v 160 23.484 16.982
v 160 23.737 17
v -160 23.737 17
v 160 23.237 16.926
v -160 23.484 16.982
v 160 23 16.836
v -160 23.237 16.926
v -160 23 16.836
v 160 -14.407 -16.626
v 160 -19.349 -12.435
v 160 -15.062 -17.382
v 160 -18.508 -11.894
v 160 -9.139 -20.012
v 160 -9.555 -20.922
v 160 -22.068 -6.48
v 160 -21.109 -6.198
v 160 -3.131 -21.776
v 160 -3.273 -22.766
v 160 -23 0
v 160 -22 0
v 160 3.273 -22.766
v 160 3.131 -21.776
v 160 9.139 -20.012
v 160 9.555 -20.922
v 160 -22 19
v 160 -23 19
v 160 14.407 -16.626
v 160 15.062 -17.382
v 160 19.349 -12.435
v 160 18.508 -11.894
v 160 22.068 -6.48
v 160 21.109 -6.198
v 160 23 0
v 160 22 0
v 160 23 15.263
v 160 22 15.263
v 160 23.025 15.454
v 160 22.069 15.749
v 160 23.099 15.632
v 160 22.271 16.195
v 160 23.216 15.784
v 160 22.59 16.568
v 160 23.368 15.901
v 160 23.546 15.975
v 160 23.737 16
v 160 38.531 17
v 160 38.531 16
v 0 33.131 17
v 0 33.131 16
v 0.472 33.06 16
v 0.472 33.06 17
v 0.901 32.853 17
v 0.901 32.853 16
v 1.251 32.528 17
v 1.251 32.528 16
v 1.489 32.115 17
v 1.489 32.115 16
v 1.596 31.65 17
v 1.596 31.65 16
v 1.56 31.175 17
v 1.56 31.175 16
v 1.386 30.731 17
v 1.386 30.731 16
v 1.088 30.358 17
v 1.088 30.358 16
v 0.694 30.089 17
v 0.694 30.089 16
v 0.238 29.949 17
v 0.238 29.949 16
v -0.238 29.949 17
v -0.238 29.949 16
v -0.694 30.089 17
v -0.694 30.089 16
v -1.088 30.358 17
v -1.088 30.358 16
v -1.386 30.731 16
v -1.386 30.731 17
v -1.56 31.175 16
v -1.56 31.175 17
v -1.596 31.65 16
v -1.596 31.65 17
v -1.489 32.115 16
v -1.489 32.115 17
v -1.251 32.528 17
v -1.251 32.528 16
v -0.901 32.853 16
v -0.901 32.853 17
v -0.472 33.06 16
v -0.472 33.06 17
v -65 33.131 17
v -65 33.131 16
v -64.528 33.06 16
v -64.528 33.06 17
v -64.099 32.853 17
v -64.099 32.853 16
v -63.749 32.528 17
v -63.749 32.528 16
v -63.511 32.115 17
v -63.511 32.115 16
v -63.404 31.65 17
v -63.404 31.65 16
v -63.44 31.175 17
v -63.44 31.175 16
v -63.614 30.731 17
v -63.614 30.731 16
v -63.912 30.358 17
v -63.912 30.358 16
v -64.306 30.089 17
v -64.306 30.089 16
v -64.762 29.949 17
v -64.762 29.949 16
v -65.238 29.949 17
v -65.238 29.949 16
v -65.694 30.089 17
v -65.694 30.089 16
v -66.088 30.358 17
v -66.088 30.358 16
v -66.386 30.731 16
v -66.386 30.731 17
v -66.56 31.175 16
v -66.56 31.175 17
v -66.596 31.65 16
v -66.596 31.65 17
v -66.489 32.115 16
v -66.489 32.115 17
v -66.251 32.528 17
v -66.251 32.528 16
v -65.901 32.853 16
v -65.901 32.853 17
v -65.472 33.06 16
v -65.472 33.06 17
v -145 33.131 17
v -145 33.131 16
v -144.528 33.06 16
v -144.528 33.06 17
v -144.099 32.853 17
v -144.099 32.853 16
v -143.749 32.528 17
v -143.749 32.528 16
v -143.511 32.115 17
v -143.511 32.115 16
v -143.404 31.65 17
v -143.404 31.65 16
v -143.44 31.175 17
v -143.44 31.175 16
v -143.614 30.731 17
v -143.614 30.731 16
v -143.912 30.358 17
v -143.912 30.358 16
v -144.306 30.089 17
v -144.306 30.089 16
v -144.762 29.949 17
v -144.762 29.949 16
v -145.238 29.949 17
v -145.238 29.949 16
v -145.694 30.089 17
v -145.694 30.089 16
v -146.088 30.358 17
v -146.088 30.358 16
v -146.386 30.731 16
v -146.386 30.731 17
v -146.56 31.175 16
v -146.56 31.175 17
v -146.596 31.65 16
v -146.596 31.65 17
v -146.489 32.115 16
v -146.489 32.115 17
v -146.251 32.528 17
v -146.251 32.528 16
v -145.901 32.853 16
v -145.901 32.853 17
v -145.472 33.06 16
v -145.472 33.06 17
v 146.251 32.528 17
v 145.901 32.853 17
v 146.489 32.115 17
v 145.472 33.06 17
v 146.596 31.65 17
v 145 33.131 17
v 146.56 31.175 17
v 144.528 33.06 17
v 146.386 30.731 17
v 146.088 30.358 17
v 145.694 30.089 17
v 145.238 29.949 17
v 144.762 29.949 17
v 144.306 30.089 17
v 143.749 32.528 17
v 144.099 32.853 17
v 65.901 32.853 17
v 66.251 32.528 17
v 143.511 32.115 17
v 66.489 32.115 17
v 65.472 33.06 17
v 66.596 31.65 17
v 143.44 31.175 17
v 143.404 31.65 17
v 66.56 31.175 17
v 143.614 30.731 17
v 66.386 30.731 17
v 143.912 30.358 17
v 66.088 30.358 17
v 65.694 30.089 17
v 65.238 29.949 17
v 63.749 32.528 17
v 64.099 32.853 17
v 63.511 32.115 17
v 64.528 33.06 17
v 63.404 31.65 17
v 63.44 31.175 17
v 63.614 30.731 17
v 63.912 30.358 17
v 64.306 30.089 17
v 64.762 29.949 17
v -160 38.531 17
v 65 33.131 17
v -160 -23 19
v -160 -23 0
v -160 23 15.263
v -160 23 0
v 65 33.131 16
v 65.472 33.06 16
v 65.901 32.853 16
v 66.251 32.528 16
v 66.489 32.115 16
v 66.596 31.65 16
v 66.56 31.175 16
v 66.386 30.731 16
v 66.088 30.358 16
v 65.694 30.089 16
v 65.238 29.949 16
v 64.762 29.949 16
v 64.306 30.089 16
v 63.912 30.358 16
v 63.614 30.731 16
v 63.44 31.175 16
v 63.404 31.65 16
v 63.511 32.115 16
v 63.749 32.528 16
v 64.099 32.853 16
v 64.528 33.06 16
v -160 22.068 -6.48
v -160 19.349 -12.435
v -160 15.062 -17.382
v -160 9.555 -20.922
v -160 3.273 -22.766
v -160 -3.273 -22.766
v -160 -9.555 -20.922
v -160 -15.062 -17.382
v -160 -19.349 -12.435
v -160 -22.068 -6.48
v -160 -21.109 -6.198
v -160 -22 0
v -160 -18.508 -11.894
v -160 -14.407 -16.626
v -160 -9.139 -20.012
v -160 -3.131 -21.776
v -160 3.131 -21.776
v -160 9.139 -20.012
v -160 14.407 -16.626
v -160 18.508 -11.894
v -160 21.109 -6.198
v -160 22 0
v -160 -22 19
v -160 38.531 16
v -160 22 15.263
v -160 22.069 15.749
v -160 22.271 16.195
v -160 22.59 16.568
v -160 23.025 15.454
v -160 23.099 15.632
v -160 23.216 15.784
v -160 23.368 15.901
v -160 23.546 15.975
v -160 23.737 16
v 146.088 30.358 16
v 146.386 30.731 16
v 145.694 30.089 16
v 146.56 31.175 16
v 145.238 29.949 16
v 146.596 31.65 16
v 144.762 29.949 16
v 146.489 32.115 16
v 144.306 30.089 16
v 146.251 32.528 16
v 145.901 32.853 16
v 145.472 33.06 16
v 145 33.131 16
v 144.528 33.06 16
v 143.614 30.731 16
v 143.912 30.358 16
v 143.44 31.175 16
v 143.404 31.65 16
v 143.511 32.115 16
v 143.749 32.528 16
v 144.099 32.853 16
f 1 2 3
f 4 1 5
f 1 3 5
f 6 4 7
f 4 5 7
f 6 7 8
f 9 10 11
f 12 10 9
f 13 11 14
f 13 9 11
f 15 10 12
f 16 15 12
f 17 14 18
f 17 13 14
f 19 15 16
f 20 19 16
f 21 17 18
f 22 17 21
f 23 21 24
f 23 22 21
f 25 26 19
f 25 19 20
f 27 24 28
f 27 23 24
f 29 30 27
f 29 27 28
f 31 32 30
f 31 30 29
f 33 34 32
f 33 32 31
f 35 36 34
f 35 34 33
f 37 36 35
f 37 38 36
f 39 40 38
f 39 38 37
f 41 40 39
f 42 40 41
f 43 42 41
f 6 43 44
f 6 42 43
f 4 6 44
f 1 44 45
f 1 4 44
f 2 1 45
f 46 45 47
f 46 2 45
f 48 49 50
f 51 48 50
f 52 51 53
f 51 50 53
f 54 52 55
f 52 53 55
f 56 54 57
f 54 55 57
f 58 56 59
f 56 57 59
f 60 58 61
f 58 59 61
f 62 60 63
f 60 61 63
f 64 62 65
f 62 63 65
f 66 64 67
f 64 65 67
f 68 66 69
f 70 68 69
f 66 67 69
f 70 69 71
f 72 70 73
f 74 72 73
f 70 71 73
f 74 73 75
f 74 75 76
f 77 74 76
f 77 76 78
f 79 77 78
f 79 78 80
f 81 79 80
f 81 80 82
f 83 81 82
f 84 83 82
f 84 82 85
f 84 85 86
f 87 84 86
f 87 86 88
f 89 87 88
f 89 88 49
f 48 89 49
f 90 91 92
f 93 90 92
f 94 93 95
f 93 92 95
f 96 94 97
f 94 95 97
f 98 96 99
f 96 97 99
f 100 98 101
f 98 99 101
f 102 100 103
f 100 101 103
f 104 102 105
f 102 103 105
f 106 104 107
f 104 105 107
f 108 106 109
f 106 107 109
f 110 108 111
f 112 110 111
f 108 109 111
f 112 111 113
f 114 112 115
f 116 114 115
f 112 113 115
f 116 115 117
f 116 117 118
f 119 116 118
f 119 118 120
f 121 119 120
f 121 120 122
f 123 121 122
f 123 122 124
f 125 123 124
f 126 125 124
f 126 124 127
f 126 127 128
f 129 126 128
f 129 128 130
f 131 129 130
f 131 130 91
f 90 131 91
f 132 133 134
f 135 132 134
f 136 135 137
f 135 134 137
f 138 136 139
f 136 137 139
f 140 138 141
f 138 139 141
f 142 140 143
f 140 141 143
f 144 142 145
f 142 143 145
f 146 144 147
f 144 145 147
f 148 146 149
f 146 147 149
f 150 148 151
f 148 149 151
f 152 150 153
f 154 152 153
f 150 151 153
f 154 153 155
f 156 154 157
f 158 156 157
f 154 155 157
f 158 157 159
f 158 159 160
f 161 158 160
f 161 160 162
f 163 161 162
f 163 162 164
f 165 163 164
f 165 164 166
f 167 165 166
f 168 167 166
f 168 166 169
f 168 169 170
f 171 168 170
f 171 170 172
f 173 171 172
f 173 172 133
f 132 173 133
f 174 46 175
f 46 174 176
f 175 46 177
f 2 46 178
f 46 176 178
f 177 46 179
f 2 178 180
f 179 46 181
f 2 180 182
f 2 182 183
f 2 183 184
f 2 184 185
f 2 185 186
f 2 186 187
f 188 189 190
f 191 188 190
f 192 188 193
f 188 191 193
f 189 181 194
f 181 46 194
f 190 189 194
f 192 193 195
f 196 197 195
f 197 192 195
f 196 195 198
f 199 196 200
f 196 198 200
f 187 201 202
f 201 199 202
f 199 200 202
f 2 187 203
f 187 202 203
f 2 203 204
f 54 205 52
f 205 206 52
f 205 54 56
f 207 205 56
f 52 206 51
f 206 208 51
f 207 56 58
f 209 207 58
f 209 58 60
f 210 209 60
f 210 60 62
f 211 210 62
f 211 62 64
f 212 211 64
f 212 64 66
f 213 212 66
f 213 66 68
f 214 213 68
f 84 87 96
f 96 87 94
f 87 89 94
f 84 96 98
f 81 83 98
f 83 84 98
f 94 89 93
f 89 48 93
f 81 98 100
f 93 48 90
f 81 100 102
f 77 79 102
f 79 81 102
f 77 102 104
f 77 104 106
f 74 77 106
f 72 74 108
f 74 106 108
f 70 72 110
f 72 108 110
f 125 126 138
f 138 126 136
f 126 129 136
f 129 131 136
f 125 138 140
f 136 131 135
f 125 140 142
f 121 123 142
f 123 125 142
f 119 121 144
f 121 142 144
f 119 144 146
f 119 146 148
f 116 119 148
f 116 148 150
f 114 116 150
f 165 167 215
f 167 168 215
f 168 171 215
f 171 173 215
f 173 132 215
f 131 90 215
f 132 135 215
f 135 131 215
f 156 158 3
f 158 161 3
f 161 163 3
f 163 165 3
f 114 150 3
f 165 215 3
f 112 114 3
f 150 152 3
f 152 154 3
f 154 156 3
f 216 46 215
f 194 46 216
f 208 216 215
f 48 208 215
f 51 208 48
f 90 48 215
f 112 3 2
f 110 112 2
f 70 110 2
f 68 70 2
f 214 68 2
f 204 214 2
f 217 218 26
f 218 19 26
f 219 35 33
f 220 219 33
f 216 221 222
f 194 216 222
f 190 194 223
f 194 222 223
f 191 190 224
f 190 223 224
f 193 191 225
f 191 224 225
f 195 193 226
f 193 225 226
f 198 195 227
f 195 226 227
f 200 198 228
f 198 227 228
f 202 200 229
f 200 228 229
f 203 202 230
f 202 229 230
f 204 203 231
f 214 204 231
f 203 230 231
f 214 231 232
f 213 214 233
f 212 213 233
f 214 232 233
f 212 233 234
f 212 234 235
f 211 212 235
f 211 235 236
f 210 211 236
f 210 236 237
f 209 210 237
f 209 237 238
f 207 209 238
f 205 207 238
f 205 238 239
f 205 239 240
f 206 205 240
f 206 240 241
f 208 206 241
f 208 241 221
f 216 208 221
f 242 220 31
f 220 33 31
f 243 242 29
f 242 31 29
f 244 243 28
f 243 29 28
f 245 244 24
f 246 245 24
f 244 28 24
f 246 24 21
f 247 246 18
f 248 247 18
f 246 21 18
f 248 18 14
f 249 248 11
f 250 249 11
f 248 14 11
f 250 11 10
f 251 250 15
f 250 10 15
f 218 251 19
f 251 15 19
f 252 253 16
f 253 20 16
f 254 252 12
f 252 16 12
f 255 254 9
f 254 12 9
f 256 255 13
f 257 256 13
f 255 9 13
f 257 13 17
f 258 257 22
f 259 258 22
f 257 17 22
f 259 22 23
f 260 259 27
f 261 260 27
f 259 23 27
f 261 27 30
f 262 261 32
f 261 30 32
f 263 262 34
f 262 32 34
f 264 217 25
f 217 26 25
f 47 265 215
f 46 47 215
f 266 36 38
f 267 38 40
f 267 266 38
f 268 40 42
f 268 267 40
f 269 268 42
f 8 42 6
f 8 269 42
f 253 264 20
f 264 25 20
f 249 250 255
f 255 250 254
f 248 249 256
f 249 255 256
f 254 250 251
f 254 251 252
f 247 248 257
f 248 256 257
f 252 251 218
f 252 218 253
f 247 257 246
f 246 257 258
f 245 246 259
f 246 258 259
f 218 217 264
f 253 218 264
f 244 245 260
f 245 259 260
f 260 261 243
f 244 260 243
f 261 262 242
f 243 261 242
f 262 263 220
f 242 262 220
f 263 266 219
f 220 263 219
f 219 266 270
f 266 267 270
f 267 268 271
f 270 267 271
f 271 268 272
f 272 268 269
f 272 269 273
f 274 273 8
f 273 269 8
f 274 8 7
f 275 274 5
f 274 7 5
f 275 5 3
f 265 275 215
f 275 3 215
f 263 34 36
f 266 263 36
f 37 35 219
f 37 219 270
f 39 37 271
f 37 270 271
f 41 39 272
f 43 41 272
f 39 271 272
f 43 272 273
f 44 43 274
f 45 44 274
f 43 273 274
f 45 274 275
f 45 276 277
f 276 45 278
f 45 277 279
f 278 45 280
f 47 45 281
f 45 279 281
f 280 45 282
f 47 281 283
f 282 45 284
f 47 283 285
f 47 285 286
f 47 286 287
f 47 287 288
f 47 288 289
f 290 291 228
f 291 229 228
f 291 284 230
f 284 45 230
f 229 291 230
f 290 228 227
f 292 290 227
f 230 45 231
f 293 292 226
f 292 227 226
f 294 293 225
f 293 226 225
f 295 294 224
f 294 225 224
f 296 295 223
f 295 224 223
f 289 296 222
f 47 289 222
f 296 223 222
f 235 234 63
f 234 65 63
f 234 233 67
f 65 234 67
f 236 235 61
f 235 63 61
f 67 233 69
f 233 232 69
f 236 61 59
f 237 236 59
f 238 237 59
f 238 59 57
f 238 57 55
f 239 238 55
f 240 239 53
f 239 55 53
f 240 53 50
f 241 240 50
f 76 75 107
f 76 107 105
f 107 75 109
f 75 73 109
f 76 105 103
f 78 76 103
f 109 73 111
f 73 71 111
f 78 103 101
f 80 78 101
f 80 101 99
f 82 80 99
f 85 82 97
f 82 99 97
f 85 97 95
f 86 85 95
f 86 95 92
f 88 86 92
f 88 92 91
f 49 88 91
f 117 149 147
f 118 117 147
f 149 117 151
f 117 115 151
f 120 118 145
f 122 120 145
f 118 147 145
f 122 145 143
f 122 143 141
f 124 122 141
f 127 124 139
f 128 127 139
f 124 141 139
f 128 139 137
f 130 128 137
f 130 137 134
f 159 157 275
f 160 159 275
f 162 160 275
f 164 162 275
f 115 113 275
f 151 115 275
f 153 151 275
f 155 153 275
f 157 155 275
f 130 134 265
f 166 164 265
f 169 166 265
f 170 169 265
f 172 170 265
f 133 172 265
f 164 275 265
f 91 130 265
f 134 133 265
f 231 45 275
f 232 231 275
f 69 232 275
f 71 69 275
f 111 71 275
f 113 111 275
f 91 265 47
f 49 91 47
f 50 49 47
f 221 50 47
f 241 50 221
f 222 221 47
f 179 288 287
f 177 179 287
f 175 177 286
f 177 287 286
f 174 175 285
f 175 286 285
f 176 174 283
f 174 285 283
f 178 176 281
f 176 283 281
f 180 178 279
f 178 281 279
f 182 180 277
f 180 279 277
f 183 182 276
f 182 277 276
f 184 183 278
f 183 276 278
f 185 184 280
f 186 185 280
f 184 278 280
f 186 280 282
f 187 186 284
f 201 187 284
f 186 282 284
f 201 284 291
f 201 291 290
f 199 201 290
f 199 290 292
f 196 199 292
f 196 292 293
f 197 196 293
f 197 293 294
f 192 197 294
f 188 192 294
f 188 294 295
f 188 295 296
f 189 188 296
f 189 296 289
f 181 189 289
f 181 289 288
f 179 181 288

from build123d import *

# Parameters (mm, degrees)
SM_BASE_FLANGE_1_DEPTH = 160
OTHER_START            = -160
OTHER_1_DEPTH          = 320
OTHER_1_2_DEPTH        = 320
SKETCH_4_R             = 1.6
CUT_EXTRUDE_1_DEPTH    = 2


# Read off the part's stored shape, not the designer's step: 绘制的折弯1
# Sheet-metal steps are written as plain solids
with BuildPart() as part:
    # Sketch 1 → 基体-法兰1 (new, symmetric)
    with BuildSketch(Plane(origin=(0, 0, 0), x_dir=(0, 0, -1), z_dir=(1, 0, 0))):
        with BuildLine():
            Line((-32, 23), (0, 23))
            ThreePointArc((0, 23), (23, 0), (0, -23))
            Line((0, -23), (-19, -23))
            Line((-19, -23), (-19, -22))
            Line((-19, -22), (0, -22))
            ThreePointArc((0, -22), (22, 0), (0, 22))
            Line((0, 22), (-32, 22))
            Line((-32, 22), (-32, 23))
        make_face()
    extrude(amount=SM_BASE_FLANGE_1_DEPTH, both=True)

    # Other 1 outline → Other 1 (cut)
    with BuildSketch(Plane.YZ.offset(OTHER_START)):
        with BuildLine():
            ThreePointArc((22, 15.2634), (22.271171885, 16.195226164), (23, 16.83604109))
            Line((23, 16.83604109), (23, 32))
            Line((23, 32), (22, 32))
            Line((22, 32), (22, 15.2634))
        make_face()
    extrude(amount=OTHER_1_DEPTH, mode=Mode.SUBTRACT)

    # Other 1 2 outline → Other 1 2 (add)
    with BuildSketch(Plane.YZ.offset(OTHER_START)):
        with BuildLine():
            ThreePointArc((23, 15.2634), (23.215745145, 15.784254855), (23.7366, 16))
            Line((23.7366, 16), (38.530753262, 16))
            Line((38.530753262, 16), (38.530753262, 17))
            Line((38.530753262, 17), (23.7366, 17))
            ThreePointArc((23.7366, 17), (23.359286442, 16.958514757), (23, 16.83604109))
            Line((23, 16.83604109), (23, 15.2634))
        make_face()
    extrude(amount=OTHER_1_2_DEPTH)

    # 草图4 → 切除-拉伸1 (cut)
    with BuildSketch(Plane(origin=(0, 0, 16), x_dir=(-1, 0, 0), z_dir=(0, 0, -1))):
        with Locations(Location((0, 31.530753262, 0), (0, 0, 90))):
            Circle(SKETCH_4_R)
        with Locations(Location((145, 31.530753262, 0), (0, 0, 90))):
            Circle(SKETCH_4_R)
        with Locations(Location((65, 31.530753262, 0), (0, 0, 90))):
            Circle(SKETCH_4_R)
        with Locations(Location((-145, 31.530753262, 0), (0, 0, 90))):
            Circle(SKETCH_4_R)
        with Locations(Location((-65, 31.530753262, 0), (0, 0, 90))):
            Circle(SKETCH_4_R)
    extrude(amount=-CUT_EXTRUDE_1_DEPTH, mode=Mode.SUBTRACT)


solid = part.part
